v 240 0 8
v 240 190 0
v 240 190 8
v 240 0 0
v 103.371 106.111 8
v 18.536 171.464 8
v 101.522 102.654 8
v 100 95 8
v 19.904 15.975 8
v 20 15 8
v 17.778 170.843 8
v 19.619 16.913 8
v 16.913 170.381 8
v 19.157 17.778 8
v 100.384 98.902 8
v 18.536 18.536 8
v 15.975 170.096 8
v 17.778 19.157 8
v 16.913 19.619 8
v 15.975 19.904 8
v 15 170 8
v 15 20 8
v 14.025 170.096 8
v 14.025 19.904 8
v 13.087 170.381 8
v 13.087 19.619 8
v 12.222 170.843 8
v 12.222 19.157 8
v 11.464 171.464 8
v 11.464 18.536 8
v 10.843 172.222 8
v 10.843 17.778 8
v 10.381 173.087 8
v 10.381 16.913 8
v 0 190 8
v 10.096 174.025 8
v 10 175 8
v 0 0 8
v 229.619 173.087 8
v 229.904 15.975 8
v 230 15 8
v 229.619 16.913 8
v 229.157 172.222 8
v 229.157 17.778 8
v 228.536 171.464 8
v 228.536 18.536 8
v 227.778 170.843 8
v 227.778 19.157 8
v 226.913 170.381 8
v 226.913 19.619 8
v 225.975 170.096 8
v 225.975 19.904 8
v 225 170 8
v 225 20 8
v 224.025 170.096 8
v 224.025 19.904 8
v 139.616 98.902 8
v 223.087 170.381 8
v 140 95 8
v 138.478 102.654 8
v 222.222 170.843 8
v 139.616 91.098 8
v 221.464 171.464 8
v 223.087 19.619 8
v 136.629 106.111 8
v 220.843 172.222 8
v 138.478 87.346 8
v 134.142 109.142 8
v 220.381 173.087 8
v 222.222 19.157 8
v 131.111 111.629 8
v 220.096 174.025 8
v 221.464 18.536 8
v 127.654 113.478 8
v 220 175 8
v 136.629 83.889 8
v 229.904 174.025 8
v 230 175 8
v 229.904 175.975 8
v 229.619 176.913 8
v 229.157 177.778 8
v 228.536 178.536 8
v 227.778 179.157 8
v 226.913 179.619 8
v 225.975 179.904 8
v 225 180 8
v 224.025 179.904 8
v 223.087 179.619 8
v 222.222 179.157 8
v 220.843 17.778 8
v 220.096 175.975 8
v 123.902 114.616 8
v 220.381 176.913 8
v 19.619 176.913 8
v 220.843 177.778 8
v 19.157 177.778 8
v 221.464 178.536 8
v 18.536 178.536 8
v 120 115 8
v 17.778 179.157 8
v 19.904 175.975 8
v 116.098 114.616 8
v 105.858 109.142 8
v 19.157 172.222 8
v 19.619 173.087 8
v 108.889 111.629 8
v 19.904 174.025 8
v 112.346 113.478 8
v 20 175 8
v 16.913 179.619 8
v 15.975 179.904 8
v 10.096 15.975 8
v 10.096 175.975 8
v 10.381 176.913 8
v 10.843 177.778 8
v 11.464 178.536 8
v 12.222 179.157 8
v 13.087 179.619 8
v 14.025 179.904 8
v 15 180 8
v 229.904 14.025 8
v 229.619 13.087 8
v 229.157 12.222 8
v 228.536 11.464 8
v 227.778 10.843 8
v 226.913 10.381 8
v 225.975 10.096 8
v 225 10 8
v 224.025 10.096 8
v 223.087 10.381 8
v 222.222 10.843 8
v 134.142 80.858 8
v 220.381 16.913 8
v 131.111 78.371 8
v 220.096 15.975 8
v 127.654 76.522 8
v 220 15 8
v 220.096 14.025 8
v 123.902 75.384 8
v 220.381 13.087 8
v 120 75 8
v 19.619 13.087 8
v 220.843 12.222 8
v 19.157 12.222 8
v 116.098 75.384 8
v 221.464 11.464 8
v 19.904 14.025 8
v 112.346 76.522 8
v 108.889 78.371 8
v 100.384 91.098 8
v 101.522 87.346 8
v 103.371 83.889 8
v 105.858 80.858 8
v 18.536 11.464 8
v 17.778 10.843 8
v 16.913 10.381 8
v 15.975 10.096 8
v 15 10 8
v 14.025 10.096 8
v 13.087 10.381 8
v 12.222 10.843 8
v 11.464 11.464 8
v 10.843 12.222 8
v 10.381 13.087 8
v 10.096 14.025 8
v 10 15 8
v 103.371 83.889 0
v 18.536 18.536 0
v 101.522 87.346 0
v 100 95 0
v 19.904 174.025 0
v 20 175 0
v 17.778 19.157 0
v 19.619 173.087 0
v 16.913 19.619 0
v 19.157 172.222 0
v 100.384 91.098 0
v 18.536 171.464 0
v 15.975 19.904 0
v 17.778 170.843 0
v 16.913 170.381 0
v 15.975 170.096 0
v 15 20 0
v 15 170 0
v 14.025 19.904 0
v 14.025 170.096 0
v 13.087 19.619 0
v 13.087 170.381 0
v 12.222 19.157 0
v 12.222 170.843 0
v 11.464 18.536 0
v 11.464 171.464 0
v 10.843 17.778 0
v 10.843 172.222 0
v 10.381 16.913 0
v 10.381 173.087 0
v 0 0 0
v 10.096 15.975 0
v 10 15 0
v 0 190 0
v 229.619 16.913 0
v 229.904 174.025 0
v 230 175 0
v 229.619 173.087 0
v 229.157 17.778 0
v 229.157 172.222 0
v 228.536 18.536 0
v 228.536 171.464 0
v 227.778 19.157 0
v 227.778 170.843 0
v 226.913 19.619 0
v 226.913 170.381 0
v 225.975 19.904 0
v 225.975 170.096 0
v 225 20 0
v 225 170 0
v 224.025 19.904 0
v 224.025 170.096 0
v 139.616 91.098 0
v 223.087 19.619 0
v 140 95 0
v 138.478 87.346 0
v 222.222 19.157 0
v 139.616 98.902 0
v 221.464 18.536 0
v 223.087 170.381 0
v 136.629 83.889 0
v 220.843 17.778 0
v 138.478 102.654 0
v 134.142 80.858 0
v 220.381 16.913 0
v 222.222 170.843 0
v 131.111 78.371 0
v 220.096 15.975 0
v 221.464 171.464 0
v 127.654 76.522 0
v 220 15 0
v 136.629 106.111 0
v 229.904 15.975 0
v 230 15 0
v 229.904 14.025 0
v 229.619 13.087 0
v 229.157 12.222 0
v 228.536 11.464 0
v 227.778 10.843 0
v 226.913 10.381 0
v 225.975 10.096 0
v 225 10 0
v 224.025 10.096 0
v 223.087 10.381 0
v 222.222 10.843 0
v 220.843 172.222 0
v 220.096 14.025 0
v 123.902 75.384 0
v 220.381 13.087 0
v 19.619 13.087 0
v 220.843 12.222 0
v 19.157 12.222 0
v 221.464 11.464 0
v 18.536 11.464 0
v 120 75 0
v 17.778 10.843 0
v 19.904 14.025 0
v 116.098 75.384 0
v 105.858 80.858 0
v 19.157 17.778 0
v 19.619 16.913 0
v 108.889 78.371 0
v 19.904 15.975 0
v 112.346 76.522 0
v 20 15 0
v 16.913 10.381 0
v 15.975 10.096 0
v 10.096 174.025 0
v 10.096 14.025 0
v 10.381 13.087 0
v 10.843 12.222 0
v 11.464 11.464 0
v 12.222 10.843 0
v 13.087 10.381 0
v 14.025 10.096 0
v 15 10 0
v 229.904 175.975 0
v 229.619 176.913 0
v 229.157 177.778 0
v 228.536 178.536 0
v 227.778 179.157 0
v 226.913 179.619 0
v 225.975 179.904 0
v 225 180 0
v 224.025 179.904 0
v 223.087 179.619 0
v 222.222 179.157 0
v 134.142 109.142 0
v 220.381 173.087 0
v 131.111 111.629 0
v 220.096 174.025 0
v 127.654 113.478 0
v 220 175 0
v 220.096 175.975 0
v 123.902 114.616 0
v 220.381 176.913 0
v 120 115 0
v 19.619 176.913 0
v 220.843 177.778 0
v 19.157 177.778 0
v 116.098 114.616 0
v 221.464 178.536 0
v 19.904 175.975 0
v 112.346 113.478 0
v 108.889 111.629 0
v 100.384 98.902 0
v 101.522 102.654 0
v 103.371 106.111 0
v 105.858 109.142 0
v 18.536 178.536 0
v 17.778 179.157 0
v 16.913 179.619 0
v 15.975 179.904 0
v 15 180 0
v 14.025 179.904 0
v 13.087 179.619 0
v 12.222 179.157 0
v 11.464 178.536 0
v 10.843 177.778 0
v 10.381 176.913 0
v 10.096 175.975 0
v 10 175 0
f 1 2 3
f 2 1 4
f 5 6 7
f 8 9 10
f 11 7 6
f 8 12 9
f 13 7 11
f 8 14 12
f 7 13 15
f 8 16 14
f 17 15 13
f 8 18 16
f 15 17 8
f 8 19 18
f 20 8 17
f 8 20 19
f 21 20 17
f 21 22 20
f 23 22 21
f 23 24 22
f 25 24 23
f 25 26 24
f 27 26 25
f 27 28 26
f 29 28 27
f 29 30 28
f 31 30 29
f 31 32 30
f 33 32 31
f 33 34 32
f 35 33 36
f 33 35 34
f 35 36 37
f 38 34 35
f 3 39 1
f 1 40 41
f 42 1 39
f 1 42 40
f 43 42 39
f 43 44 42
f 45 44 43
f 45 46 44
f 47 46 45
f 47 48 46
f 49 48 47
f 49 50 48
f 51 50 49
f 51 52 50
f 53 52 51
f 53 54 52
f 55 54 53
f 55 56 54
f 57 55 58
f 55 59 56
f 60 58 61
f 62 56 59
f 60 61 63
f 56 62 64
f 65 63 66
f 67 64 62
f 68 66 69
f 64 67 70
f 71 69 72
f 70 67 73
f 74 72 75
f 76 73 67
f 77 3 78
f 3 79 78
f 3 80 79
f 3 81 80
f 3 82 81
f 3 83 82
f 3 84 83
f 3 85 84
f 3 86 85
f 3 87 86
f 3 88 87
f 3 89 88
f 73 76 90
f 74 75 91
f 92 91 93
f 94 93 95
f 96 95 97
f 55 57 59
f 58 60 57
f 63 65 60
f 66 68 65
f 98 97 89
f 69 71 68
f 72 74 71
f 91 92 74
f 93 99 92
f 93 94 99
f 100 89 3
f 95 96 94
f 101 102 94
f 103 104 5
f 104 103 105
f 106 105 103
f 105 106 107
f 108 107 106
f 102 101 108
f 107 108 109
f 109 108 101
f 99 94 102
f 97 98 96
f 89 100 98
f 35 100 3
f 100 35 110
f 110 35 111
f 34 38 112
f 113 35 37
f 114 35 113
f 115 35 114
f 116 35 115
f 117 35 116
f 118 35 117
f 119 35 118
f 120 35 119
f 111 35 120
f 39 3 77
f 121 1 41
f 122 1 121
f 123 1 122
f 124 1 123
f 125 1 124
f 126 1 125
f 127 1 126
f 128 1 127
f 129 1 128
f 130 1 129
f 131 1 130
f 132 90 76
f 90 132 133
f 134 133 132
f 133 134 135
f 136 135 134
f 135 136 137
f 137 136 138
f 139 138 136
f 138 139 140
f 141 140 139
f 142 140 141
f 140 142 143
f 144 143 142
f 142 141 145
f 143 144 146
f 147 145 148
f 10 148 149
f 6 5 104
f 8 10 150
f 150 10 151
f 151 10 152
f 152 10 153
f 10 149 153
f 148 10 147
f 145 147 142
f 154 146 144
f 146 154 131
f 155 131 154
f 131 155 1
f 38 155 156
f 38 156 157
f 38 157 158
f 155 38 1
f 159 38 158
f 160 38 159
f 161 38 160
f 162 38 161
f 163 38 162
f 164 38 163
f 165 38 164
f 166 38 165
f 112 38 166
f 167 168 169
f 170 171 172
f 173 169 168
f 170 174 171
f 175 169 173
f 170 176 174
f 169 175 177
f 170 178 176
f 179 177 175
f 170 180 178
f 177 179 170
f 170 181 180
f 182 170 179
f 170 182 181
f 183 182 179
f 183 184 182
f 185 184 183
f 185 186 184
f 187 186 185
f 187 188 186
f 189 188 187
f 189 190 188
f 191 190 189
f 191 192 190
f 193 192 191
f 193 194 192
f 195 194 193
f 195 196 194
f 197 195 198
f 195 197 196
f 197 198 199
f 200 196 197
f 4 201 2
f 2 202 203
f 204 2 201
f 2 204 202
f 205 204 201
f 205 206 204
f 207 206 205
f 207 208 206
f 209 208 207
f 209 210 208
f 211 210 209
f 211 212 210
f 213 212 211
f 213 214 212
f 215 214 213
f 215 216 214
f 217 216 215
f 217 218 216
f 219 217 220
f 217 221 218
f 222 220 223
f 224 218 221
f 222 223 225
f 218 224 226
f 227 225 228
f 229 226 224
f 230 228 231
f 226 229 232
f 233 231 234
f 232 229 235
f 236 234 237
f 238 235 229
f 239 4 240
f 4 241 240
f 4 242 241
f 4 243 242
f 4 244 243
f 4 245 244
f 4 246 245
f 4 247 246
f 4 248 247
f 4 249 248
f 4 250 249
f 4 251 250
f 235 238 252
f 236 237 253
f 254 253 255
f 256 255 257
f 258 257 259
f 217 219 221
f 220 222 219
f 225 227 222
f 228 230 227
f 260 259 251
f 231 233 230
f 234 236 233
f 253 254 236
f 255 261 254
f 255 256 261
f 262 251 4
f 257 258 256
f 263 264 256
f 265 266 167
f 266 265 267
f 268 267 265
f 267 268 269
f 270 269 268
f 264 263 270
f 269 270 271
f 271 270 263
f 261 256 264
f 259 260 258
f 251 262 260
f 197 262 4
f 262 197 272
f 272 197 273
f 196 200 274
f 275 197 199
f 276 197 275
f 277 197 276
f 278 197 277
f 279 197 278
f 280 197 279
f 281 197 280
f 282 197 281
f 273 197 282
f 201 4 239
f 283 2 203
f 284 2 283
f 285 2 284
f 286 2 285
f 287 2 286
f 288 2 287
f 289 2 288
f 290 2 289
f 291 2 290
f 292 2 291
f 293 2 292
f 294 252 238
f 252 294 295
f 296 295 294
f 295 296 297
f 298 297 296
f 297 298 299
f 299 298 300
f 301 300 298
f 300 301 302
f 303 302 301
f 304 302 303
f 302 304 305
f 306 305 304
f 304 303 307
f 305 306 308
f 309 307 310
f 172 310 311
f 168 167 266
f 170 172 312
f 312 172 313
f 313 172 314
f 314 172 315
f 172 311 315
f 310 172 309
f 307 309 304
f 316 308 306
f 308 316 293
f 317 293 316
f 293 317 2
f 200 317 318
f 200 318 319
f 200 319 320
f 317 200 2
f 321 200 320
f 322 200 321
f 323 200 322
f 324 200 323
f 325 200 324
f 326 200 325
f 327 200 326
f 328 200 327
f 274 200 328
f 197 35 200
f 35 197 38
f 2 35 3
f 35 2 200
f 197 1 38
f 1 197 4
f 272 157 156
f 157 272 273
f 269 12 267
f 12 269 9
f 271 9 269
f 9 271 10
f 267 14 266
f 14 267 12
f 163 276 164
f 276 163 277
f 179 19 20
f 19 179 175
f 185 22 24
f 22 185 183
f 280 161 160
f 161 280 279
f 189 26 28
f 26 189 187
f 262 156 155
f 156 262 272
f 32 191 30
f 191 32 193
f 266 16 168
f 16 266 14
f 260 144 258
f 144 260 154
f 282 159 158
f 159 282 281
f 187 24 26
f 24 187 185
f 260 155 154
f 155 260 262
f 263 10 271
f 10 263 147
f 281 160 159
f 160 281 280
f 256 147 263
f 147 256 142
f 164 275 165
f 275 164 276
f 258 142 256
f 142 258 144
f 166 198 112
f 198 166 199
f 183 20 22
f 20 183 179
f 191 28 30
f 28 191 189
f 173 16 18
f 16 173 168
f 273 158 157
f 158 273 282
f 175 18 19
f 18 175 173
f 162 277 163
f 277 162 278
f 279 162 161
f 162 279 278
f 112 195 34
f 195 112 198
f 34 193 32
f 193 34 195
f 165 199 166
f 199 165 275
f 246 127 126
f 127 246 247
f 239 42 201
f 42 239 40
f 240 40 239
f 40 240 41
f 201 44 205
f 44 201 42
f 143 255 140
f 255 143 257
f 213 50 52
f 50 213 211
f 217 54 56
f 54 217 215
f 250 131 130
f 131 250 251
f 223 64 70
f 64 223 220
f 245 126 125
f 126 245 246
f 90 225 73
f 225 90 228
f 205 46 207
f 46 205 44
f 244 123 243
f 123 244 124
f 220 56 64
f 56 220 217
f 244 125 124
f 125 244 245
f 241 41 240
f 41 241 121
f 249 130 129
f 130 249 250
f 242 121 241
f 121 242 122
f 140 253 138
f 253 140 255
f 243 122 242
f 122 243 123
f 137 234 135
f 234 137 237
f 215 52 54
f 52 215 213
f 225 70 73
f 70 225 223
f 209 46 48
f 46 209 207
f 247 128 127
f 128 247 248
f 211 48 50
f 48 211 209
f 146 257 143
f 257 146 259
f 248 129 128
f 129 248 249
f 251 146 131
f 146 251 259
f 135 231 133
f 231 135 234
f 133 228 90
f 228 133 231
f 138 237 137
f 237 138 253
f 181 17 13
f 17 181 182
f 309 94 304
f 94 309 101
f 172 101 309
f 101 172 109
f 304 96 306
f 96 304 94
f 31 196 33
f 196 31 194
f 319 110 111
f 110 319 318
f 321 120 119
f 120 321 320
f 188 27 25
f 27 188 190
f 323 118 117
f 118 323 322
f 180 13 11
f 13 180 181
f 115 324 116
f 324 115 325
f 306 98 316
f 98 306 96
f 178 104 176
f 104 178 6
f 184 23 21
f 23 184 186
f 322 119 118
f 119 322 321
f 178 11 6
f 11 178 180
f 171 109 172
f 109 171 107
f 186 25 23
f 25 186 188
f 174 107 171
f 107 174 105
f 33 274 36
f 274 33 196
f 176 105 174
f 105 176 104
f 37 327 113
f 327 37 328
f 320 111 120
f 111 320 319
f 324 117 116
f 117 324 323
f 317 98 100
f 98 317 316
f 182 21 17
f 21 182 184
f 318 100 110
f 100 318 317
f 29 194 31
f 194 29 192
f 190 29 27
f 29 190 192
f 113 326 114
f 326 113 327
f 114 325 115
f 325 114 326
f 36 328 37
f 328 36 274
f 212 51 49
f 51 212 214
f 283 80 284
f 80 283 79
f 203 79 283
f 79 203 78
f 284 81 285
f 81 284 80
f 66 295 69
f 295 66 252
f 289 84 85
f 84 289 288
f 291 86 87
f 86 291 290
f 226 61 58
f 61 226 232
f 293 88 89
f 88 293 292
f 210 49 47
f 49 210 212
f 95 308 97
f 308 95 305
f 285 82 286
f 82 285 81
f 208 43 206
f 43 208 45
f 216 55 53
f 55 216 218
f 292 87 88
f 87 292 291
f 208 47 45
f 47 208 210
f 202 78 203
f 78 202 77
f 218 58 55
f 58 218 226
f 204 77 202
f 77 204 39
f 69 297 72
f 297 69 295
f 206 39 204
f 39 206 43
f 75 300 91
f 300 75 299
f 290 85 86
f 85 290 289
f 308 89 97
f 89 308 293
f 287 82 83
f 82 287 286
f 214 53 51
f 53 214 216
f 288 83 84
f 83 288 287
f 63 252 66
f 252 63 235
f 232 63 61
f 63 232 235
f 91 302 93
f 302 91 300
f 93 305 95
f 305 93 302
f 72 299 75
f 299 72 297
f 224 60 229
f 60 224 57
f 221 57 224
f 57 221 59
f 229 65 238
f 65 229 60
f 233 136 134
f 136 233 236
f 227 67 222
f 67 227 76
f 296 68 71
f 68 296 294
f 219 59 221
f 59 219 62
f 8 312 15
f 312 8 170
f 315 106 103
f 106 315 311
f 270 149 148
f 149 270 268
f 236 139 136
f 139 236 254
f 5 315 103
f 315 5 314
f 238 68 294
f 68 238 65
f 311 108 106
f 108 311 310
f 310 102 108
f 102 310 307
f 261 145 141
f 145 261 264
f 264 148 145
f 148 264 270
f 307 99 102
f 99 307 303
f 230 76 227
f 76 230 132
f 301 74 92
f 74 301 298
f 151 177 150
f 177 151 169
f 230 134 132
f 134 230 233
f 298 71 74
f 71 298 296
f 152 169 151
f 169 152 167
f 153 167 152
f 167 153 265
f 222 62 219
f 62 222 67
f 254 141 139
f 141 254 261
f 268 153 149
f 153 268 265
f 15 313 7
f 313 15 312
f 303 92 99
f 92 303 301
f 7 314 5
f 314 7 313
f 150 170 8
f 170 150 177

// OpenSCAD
$fn = 32;

// ----------------------------------------------------------------------
// Big plate: 200-250 mm adapter plate
// ----------------------------------------------------------------------

// --- parameters (mm) ---
plate_l = 240;            // plate length, X
plate_w = 190;            // plate width, Y
plate_t = 8;              // plate thickness, Z
corner_d = 10;            // corner hole diameter
corner_in = 15;           // corner hole inset from the edges
bore_d = 40;              // central bore

difference() {
  cube([plate_l, plate_w, plate_t]);
  translate([corner_in, corner_in, -1]) cylinder(h = plate_t + 2, d = corner_d);
  translate([plate_l - corner_in, corner_in, -1]) cylinder(h = plate_t + 2, d = corner_d);
  translate([corner_in, plate_w - corner_in, -1]) cylinder(h = plate_t + 2, d = corner_d);
  translate([plate_l - corner_in, plate_w - corner_in, -1]) cylinder(h = plate_t + 2, d = corner_d);
  translate([plate_l / 2, plate_w / 2, -1]) cylinder(h = plate_t + 2, d = bore_d);
}
